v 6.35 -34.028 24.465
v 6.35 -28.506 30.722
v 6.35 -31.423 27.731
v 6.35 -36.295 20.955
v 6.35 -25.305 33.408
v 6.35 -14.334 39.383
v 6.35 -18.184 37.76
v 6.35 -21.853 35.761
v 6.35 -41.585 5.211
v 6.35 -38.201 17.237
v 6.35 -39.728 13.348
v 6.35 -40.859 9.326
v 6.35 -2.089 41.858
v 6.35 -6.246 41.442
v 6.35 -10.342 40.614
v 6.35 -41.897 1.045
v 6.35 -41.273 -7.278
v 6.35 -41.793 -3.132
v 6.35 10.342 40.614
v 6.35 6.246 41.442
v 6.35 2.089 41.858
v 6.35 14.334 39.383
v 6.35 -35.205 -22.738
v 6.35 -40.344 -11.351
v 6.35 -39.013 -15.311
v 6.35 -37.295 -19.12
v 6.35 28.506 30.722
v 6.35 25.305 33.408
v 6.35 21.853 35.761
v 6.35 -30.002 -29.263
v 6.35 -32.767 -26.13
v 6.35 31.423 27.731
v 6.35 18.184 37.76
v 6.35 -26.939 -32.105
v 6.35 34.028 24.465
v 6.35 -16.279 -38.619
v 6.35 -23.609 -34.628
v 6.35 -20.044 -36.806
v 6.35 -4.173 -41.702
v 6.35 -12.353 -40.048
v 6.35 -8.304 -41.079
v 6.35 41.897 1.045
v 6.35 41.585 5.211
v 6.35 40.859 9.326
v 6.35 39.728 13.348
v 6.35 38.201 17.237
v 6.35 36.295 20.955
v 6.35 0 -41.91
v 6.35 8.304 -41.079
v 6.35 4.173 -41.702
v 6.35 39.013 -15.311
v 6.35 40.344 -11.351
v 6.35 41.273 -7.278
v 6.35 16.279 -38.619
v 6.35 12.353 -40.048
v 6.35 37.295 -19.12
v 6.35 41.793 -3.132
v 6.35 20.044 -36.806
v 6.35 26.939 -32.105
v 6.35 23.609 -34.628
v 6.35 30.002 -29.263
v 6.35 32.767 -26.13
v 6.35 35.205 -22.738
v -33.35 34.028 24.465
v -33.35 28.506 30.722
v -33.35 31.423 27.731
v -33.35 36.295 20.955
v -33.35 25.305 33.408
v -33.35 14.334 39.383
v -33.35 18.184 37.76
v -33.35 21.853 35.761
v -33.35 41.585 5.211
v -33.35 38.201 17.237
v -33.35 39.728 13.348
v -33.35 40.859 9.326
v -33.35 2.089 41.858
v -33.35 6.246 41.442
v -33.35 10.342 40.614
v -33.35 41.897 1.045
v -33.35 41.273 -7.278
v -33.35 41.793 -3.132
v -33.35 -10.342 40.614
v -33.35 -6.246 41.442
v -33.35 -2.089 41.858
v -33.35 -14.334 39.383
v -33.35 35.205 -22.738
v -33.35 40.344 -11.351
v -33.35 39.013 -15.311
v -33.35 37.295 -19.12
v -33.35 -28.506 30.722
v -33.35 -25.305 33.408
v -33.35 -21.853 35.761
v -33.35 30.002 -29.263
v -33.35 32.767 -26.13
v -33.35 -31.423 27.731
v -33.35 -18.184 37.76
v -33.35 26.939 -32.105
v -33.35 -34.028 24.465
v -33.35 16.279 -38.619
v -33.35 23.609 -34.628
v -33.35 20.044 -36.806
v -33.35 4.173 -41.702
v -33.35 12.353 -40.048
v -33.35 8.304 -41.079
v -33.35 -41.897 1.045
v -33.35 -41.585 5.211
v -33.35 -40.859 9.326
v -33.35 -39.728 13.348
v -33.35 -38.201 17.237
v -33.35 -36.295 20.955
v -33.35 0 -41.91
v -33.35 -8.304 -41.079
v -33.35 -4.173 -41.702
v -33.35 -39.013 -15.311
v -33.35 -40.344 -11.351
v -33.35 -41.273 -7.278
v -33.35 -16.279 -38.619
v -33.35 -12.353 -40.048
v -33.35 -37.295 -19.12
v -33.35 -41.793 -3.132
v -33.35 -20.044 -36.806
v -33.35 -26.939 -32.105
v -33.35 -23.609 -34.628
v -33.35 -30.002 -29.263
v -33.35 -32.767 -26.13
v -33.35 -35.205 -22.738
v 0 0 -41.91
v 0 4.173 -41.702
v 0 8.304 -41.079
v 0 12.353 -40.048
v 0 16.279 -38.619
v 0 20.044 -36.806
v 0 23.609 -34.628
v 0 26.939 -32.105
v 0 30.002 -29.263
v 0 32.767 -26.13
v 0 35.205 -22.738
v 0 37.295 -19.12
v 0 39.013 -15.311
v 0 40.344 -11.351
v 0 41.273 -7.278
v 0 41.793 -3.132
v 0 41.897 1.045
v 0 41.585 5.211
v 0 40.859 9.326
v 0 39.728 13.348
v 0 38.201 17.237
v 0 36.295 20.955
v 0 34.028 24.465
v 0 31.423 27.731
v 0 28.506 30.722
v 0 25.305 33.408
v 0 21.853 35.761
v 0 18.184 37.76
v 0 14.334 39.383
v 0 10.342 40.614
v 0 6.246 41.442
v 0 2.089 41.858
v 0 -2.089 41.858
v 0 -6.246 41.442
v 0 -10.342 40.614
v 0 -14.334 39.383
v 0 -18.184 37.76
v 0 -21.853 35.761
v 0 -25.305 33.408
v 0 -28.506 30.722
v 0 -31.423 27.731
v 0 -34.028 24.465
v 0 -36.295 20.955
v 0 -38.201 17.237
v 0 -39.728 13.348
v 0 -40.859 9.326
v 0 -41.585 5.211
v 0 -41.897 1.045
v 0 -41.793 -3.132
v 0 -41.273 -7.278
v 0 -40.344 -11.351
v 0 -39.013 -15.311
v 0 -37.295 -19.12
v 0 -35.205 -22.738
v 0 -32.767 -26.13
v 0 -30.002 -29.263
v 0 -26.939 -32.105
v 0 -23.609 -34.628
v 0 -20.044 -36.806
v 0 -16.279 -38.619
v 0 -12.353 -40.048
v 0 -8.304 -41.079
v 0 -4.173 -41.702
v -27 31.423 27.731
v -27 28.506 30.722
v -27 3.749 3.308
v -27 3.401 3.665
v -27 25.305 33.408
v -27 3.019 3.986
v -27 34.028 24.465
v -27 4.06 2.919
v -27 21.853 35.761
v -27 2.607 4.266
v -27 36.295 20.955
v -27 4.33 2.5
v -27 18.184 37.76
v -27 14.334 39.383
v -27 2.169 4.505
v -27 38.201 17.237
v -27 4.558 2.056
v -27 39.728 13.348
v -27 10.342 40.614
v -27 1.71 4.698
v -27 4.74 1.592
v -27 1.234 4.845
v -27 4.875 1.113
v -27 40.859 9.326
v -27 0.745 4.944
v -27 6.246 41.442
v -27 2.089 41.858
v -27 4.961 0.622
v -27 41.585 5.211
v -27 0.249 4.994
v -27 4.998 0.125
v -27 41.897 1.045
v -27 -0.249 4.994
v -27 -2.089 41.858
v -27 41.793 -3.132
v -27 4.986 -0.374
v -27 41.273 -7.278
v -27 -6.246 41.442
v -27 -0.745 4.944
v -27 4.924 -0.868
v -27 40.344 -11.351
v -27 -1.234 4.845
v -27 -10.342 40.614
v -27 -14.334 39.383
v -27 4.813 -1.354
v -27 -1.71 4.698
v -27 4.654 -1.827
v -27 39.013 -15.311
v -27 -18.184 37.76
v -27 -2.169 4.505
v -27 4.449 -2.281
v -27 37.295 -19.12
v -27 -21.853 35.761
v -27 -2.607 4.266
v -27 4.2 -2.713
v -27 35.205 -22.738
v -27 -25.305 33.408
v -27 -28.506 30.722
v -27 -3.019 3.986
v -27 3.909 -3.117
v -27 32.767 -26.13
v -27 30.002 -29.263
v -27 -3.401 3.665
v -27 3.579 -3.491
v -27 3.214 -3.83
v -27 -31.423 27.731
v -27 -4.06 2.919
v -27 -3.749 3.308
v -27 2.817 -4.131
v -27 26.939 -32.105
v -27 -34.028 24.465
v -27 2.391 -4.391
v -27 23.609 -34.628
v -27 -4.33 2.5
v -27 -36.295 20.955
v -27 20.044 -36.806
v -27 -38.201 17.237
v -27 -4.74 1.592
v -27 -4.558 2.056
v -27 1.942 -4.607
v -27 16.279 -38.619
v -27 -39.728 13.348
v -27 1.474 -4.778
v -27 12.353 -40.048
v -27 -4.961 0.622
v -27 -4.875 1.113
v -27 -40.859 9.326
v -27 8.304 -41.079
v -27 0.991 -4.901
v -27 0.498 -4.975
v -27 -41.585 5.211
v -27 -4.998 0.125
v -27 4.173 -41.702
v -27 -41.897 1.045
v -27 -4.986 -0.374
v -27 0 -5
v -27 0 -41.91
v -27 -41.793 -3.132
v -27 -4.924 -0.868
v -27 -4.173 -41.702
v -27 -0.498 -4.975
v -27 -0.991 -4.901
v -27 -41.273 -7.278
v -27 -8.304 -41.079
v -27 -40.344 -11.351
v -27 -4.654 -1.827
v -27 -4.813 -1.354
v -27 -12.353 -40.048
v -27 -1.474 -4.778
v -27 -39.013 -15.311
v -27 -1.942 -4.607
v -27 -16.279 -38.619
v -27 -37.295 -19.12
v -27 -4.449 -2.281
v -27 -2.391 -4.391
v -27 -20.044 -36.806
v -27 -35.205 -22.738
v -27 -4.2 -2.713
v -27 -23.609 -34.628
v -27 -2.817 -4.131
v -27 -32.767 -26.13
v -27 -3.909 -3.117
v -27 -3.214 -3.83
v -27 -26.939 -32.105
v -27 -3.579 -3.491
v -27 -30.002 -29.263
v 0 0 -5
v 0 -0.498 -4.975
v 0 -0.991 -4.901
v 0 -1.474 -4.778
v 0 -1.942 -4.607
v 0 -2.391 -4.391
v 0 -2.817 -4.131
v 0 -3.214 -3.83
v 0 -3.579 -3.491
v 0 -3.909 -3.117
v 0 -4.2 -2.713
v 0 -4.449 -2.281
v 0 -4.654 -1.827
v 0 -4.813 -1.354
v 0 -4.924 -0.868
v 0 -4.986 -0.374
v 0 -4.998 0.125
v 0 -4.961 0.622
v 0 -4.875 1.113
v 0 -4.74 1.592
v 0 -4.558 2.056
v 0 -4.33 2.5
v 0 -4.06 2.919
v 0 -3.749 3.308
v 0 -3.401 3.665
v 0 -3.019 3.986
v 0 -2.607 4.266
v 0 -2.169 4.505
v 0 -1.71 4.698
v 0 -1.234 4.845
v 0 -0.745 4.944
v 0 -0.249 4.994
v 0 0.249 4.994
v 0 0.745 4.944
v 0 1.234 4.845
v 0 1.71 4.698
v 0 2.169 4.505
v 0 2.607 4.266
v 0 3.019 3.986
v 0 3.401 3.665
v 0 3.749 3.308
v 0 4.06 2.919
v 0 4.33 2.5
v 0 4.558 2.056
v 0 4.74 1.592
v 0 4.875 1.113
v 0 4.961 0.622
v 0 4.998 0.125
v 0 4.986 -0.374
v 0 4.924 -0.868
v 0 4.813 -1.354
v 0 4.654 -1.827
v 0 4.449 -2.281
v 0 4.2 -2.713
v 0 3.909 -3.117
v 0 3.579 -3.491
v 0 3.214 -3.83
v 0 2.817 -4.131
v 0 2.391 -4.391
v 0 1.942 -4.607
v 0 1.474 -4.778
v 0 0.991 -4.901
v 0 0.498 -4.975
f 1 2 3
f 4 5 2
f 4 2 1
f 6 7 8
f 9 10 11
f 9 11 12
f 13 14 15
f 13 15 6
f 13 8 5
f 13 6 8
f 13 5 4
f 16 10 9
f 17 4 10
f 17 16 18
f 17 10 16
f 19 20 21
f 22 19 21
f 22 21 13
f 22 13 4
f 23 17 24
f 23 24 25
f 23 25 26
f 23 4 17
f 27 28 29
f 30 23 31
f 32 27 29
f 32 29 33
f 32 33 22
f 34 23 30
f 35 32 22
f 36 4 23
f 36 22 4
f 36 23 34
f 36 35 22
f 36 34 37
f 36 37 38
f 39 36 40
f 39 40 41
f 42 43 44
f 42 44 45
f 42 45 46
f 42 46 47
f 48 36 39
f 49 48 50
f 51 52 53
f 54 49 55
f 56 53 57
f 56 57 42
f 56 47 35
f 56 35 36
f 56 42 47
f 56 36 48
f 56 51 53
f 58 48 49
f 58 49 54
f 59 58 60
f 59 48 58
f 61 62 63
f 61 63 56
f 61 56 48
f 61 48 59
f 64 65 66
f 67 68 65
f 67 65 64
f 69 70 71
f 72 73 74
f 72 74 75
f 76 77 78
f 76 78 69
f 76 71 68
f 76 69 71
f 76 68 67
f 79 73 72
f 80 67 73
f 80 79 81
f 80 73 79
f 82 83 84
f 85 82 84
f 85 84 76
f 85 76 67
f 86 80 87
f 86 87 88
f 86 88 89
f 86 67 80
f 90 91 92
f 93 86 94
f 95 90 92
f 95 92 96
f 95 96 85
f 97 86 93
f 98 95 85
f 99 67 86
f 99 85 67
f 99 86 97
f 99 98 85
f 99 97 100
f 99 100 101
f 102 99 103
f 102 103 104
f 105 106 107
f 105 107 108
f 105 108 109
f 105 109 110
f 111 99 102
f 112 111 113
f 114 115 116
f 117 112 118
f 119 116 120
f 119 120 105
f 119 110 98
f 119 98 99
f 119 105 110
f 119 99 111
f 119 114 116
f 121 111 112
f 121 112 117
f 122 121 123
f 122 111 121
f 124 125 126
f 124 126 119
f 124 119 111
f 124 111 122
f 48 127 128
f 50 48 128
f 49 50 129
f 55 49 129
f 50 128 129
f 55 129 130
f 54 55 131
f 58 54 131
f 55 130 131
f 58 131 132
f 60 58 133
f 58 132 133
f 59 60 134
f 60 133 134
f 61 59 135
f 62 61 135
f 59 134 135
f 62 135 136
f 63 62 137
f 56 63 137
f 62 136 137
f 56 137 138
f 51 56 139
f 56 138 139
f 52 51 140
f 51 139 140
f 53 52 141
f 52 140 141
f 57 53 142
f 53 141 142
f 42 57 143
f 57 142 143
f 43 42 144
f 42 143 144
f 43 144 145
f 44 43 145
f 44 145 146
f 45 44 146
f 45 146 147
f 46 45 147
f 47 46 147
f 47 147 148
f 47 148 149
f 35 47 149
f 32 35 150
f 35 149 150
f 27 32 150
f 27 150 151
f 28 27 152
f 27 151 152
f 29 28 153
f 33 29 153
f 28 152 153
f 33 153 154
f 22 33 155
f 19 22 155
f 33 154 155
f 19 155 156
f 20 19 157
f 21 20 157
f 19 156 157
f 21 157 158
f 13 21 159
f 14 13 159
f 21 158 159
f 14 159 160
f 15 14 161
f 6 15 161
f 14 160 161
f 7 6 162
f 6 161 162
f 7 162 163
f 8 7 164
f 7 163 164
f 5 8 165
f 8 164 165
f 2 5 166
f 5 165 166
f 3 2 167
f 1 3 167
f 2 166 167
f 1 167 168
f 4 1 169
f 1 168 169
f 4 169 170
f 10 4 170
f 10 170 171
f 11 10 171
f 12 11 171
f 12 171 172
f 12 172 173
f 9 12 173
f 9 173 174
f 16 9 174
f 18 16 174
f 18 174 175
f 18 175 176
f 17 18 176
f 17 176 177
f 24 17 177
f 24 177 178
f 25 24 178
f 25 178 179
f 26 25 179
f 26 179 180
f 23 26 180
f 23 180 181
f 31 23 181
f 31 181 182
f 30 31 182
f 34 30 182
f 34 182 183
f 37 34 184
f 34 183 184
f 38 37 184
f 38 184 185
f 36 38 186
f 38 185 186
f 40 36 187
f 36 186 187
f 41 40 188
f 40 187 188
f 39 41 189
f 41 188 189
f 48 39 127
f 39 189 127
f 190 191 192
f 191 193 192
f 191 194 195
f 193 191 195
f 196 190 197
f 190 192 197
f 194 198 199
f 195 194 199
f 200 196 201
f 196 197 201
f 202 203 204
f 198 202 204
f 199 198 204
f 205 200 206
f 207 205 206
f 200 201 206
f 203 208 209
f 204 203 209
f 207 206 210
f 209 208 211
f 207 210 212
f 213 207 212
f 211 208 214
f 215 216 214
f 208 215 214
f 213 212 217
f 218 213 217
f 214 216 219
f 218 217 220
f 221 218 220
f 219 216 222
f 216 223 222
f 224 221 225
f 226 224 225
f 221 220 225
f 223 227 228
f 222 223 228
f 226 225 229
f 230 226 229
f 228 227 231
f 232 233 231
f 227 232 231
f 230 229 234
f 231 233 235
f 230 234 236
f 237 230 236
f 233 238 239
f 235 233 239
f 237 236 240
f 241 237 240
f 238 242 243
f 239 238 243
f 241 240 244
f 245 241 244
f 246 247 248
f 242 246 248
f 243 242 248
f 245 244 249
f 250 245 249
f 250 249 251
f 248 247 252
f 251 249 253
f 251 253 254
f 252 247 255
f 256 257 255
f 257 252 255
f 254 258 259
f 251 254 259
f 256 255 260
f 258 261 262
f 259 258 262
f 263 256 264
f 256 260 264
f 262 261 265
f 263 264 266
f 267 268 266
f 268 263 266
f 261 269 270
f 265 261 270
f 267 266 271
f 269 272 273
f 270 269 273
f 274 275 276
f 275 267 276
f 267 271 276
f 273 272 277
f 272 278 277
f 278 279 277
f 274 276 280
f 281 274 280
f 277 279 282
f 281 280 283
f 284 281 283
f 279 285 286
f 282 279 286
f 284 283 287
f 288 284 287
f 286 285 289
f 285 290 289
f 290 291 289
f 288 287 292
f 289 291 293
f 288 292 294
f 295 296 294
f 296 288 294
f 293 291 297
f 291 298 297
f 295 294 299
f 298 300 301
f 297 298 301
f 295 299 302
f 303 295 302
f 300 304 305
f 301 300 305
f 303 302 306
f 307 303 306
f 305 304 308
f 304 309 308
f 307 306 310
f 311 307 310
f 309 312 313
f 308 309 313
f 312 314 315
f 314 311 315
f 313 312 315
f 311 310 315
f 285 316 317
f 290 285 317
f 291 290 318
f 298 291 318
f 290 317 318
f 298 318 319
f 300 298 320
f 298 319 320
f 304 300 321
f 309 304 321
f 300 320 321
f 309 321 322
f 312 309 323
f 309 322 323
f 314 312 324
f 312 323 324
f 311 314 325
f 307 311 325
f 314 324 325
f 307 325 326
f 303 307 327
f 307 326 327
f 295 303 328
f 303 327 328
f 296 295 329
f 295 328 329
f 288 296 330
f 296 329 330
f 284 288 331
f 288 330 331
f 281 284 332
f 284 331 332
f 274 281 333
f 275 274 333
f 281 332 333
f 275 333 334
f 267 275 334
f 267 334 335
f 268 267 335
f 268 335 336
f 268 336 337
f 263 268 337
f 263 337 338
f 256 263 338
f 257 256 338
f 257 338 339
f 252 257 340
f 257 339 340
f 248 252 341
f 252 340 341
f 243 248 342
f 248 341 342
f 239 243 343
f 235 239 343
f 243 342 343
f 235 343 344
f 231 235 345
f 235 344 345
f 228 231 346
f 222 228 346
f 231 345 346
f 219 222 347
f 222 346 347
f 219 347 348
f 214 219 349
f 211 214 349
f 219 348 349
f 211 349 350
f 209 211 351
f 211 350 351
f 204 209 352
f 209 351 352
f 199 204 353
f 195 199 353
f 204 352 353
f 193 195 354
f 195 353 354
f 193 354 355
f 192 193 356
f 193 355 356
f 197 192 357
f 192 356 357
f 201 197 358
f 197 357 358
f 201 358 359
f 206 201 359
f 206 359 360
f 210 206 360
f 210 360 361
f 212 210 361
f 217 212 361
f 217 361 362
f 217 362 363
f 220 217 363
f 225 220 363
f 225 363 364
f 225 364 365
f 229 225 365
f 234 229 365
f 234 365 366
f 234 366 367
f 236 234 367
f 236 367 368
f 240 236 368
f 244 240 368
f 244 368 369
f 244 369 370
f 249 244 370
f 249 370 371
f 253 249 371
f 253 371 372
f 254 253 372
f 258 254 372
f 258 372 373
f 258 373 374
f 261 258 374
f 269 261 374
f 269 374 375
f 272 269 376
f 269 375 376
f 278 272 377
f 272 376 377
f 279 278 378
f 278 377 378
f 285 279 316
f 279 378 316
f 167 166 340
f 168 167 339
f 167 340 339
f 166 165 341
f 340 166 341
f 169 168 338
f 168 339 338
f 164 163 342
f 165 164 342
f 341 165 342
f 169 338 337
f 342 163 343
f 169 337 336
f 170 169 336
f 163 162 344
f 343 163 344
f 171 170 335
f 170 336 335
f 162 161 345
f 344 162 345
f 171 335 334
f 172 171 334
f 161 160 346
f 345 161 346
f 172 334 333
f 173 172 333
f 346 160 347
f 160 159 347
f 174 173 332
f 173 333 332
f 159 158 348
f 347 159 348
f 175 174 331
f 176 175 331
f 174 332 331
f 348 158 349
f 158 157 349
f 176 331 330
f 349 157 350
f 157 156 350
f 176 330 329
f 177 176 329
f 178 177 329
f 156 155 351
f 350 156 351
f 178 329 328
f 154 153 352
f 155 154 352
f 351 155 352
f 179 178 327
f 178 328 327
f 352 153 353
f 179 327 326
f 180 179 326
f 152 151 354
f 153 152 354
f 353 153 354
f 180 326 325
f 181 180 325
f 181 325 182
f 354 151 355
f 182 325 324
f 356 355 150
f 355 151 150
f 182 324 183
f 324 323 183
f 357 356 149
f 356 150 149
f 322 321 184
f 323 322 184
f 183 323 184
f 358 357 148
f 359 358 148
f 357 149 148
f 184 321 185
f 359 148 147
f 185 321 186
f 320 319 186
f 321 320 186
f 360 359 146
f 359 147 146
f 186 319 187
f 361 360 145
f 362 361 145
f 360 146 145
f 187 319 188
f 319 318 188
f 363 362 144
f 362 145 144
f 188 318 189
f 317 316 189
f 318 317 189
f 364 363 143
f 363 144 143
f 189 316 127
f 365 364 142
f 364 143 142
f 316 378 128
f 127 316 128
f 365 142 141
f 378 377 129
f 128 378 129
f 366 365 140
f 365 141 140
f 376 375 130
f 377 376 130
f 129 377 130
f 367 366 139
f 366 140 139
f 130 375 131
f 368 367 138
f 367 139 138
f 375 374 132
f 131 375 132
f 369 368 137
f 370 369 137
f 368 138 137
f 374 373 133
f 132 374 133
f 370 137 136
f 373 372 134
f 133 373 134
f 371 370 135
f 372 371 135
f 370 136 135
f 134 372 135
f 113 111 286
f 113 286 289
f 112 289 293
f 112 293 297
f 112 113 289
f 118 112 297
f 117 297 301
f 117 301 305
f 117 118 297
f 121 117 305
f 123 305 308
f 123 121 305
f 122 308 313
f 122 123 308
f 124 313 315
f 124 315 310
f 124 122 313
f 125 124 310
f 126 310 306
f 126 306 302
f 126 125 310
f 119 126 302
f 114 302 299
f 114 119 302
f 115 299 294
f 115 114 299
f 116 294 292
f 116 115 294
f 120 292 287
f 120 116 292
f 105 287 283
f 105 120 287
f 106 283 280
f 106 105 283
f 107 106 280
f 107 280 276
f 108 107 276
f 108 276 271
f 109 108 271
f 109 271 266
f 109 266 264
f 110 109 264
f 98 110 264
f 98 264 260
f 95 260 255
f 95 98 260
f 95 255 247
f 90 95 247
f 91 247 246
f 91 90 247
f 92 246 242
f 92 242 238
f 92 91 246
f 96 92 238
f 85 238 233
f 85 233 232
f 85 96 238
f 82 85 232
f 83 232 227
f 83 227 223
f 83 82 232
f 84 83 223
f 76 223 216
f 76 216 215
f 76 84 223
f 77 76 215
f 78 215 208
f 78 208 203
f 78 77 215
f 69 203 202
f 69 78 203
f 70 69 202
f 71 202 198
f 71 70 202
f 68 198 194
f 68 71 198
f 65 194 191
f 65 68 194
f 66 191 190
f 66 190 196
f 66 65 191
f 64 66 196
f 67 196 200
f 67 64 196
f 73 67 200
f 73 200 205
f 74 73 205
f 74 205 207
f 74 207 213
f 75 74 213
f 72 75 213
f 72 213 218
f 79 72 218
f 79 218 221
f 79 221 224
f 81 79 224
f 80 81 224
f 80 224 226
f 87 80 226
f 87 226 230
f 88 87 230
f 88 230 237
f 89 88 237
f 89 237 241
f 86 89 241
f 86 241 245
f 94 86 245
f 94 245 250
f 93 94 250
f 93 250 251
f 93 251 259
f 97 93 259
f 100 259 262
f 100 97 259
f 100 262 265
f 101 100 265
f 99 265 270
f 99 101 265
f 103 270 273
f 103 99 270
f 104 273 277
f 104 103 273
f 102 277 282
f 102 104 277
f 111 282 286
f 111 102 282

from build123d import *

# Parameters (mm, degrees)
SKETCH4_R           = 41.91
BOSS_EXTRUDE1_DEPTH = 6.35
SKETCH5_R           = 5
BOSS_EXTRUDE4_DEPTH = 27
BOSS_EXTRUDE5_START = 6.35
SKETCH7_R           = 41.91
BOSS_EXTRUDE5_DEPTH = 6.35


with BuildPart() as part:
    # Sketch4 → Boss-Extrude1 (new body)
    with BuildSketch(Plane(origin=(0, 0, 0), x_dir=(0, 0, -1), z_dir=(1, 0, 0))):
        Circle(SKETCH4_R)
    extrude(amount=BOSS_EXTRUDE1_DEPTH)

    # Sketch5 → Boss-Extrude4 (add)
    with BuildSketch(Plane.ZY):
        with Locations(Location((0, 0, 0), (0, 0, 180))):
            Circle(SKETCH5_R)
    extrude(amount=BOSS_EXTRUDE4_DEPTH)

    # Sketch7 → Boss-Extrude5 (add)
    with BuildSketch(Plane.ZY.offset(27).offset(BOSS_EXTRUDE5_START)):
        with Locations(Location((0, 0, 0), (0, 0, 180))):
            Circle(SKETCH7_R)
    extrude(amount=-BOSS_EXTRUDE5_DEPTH)


solid = part.part
